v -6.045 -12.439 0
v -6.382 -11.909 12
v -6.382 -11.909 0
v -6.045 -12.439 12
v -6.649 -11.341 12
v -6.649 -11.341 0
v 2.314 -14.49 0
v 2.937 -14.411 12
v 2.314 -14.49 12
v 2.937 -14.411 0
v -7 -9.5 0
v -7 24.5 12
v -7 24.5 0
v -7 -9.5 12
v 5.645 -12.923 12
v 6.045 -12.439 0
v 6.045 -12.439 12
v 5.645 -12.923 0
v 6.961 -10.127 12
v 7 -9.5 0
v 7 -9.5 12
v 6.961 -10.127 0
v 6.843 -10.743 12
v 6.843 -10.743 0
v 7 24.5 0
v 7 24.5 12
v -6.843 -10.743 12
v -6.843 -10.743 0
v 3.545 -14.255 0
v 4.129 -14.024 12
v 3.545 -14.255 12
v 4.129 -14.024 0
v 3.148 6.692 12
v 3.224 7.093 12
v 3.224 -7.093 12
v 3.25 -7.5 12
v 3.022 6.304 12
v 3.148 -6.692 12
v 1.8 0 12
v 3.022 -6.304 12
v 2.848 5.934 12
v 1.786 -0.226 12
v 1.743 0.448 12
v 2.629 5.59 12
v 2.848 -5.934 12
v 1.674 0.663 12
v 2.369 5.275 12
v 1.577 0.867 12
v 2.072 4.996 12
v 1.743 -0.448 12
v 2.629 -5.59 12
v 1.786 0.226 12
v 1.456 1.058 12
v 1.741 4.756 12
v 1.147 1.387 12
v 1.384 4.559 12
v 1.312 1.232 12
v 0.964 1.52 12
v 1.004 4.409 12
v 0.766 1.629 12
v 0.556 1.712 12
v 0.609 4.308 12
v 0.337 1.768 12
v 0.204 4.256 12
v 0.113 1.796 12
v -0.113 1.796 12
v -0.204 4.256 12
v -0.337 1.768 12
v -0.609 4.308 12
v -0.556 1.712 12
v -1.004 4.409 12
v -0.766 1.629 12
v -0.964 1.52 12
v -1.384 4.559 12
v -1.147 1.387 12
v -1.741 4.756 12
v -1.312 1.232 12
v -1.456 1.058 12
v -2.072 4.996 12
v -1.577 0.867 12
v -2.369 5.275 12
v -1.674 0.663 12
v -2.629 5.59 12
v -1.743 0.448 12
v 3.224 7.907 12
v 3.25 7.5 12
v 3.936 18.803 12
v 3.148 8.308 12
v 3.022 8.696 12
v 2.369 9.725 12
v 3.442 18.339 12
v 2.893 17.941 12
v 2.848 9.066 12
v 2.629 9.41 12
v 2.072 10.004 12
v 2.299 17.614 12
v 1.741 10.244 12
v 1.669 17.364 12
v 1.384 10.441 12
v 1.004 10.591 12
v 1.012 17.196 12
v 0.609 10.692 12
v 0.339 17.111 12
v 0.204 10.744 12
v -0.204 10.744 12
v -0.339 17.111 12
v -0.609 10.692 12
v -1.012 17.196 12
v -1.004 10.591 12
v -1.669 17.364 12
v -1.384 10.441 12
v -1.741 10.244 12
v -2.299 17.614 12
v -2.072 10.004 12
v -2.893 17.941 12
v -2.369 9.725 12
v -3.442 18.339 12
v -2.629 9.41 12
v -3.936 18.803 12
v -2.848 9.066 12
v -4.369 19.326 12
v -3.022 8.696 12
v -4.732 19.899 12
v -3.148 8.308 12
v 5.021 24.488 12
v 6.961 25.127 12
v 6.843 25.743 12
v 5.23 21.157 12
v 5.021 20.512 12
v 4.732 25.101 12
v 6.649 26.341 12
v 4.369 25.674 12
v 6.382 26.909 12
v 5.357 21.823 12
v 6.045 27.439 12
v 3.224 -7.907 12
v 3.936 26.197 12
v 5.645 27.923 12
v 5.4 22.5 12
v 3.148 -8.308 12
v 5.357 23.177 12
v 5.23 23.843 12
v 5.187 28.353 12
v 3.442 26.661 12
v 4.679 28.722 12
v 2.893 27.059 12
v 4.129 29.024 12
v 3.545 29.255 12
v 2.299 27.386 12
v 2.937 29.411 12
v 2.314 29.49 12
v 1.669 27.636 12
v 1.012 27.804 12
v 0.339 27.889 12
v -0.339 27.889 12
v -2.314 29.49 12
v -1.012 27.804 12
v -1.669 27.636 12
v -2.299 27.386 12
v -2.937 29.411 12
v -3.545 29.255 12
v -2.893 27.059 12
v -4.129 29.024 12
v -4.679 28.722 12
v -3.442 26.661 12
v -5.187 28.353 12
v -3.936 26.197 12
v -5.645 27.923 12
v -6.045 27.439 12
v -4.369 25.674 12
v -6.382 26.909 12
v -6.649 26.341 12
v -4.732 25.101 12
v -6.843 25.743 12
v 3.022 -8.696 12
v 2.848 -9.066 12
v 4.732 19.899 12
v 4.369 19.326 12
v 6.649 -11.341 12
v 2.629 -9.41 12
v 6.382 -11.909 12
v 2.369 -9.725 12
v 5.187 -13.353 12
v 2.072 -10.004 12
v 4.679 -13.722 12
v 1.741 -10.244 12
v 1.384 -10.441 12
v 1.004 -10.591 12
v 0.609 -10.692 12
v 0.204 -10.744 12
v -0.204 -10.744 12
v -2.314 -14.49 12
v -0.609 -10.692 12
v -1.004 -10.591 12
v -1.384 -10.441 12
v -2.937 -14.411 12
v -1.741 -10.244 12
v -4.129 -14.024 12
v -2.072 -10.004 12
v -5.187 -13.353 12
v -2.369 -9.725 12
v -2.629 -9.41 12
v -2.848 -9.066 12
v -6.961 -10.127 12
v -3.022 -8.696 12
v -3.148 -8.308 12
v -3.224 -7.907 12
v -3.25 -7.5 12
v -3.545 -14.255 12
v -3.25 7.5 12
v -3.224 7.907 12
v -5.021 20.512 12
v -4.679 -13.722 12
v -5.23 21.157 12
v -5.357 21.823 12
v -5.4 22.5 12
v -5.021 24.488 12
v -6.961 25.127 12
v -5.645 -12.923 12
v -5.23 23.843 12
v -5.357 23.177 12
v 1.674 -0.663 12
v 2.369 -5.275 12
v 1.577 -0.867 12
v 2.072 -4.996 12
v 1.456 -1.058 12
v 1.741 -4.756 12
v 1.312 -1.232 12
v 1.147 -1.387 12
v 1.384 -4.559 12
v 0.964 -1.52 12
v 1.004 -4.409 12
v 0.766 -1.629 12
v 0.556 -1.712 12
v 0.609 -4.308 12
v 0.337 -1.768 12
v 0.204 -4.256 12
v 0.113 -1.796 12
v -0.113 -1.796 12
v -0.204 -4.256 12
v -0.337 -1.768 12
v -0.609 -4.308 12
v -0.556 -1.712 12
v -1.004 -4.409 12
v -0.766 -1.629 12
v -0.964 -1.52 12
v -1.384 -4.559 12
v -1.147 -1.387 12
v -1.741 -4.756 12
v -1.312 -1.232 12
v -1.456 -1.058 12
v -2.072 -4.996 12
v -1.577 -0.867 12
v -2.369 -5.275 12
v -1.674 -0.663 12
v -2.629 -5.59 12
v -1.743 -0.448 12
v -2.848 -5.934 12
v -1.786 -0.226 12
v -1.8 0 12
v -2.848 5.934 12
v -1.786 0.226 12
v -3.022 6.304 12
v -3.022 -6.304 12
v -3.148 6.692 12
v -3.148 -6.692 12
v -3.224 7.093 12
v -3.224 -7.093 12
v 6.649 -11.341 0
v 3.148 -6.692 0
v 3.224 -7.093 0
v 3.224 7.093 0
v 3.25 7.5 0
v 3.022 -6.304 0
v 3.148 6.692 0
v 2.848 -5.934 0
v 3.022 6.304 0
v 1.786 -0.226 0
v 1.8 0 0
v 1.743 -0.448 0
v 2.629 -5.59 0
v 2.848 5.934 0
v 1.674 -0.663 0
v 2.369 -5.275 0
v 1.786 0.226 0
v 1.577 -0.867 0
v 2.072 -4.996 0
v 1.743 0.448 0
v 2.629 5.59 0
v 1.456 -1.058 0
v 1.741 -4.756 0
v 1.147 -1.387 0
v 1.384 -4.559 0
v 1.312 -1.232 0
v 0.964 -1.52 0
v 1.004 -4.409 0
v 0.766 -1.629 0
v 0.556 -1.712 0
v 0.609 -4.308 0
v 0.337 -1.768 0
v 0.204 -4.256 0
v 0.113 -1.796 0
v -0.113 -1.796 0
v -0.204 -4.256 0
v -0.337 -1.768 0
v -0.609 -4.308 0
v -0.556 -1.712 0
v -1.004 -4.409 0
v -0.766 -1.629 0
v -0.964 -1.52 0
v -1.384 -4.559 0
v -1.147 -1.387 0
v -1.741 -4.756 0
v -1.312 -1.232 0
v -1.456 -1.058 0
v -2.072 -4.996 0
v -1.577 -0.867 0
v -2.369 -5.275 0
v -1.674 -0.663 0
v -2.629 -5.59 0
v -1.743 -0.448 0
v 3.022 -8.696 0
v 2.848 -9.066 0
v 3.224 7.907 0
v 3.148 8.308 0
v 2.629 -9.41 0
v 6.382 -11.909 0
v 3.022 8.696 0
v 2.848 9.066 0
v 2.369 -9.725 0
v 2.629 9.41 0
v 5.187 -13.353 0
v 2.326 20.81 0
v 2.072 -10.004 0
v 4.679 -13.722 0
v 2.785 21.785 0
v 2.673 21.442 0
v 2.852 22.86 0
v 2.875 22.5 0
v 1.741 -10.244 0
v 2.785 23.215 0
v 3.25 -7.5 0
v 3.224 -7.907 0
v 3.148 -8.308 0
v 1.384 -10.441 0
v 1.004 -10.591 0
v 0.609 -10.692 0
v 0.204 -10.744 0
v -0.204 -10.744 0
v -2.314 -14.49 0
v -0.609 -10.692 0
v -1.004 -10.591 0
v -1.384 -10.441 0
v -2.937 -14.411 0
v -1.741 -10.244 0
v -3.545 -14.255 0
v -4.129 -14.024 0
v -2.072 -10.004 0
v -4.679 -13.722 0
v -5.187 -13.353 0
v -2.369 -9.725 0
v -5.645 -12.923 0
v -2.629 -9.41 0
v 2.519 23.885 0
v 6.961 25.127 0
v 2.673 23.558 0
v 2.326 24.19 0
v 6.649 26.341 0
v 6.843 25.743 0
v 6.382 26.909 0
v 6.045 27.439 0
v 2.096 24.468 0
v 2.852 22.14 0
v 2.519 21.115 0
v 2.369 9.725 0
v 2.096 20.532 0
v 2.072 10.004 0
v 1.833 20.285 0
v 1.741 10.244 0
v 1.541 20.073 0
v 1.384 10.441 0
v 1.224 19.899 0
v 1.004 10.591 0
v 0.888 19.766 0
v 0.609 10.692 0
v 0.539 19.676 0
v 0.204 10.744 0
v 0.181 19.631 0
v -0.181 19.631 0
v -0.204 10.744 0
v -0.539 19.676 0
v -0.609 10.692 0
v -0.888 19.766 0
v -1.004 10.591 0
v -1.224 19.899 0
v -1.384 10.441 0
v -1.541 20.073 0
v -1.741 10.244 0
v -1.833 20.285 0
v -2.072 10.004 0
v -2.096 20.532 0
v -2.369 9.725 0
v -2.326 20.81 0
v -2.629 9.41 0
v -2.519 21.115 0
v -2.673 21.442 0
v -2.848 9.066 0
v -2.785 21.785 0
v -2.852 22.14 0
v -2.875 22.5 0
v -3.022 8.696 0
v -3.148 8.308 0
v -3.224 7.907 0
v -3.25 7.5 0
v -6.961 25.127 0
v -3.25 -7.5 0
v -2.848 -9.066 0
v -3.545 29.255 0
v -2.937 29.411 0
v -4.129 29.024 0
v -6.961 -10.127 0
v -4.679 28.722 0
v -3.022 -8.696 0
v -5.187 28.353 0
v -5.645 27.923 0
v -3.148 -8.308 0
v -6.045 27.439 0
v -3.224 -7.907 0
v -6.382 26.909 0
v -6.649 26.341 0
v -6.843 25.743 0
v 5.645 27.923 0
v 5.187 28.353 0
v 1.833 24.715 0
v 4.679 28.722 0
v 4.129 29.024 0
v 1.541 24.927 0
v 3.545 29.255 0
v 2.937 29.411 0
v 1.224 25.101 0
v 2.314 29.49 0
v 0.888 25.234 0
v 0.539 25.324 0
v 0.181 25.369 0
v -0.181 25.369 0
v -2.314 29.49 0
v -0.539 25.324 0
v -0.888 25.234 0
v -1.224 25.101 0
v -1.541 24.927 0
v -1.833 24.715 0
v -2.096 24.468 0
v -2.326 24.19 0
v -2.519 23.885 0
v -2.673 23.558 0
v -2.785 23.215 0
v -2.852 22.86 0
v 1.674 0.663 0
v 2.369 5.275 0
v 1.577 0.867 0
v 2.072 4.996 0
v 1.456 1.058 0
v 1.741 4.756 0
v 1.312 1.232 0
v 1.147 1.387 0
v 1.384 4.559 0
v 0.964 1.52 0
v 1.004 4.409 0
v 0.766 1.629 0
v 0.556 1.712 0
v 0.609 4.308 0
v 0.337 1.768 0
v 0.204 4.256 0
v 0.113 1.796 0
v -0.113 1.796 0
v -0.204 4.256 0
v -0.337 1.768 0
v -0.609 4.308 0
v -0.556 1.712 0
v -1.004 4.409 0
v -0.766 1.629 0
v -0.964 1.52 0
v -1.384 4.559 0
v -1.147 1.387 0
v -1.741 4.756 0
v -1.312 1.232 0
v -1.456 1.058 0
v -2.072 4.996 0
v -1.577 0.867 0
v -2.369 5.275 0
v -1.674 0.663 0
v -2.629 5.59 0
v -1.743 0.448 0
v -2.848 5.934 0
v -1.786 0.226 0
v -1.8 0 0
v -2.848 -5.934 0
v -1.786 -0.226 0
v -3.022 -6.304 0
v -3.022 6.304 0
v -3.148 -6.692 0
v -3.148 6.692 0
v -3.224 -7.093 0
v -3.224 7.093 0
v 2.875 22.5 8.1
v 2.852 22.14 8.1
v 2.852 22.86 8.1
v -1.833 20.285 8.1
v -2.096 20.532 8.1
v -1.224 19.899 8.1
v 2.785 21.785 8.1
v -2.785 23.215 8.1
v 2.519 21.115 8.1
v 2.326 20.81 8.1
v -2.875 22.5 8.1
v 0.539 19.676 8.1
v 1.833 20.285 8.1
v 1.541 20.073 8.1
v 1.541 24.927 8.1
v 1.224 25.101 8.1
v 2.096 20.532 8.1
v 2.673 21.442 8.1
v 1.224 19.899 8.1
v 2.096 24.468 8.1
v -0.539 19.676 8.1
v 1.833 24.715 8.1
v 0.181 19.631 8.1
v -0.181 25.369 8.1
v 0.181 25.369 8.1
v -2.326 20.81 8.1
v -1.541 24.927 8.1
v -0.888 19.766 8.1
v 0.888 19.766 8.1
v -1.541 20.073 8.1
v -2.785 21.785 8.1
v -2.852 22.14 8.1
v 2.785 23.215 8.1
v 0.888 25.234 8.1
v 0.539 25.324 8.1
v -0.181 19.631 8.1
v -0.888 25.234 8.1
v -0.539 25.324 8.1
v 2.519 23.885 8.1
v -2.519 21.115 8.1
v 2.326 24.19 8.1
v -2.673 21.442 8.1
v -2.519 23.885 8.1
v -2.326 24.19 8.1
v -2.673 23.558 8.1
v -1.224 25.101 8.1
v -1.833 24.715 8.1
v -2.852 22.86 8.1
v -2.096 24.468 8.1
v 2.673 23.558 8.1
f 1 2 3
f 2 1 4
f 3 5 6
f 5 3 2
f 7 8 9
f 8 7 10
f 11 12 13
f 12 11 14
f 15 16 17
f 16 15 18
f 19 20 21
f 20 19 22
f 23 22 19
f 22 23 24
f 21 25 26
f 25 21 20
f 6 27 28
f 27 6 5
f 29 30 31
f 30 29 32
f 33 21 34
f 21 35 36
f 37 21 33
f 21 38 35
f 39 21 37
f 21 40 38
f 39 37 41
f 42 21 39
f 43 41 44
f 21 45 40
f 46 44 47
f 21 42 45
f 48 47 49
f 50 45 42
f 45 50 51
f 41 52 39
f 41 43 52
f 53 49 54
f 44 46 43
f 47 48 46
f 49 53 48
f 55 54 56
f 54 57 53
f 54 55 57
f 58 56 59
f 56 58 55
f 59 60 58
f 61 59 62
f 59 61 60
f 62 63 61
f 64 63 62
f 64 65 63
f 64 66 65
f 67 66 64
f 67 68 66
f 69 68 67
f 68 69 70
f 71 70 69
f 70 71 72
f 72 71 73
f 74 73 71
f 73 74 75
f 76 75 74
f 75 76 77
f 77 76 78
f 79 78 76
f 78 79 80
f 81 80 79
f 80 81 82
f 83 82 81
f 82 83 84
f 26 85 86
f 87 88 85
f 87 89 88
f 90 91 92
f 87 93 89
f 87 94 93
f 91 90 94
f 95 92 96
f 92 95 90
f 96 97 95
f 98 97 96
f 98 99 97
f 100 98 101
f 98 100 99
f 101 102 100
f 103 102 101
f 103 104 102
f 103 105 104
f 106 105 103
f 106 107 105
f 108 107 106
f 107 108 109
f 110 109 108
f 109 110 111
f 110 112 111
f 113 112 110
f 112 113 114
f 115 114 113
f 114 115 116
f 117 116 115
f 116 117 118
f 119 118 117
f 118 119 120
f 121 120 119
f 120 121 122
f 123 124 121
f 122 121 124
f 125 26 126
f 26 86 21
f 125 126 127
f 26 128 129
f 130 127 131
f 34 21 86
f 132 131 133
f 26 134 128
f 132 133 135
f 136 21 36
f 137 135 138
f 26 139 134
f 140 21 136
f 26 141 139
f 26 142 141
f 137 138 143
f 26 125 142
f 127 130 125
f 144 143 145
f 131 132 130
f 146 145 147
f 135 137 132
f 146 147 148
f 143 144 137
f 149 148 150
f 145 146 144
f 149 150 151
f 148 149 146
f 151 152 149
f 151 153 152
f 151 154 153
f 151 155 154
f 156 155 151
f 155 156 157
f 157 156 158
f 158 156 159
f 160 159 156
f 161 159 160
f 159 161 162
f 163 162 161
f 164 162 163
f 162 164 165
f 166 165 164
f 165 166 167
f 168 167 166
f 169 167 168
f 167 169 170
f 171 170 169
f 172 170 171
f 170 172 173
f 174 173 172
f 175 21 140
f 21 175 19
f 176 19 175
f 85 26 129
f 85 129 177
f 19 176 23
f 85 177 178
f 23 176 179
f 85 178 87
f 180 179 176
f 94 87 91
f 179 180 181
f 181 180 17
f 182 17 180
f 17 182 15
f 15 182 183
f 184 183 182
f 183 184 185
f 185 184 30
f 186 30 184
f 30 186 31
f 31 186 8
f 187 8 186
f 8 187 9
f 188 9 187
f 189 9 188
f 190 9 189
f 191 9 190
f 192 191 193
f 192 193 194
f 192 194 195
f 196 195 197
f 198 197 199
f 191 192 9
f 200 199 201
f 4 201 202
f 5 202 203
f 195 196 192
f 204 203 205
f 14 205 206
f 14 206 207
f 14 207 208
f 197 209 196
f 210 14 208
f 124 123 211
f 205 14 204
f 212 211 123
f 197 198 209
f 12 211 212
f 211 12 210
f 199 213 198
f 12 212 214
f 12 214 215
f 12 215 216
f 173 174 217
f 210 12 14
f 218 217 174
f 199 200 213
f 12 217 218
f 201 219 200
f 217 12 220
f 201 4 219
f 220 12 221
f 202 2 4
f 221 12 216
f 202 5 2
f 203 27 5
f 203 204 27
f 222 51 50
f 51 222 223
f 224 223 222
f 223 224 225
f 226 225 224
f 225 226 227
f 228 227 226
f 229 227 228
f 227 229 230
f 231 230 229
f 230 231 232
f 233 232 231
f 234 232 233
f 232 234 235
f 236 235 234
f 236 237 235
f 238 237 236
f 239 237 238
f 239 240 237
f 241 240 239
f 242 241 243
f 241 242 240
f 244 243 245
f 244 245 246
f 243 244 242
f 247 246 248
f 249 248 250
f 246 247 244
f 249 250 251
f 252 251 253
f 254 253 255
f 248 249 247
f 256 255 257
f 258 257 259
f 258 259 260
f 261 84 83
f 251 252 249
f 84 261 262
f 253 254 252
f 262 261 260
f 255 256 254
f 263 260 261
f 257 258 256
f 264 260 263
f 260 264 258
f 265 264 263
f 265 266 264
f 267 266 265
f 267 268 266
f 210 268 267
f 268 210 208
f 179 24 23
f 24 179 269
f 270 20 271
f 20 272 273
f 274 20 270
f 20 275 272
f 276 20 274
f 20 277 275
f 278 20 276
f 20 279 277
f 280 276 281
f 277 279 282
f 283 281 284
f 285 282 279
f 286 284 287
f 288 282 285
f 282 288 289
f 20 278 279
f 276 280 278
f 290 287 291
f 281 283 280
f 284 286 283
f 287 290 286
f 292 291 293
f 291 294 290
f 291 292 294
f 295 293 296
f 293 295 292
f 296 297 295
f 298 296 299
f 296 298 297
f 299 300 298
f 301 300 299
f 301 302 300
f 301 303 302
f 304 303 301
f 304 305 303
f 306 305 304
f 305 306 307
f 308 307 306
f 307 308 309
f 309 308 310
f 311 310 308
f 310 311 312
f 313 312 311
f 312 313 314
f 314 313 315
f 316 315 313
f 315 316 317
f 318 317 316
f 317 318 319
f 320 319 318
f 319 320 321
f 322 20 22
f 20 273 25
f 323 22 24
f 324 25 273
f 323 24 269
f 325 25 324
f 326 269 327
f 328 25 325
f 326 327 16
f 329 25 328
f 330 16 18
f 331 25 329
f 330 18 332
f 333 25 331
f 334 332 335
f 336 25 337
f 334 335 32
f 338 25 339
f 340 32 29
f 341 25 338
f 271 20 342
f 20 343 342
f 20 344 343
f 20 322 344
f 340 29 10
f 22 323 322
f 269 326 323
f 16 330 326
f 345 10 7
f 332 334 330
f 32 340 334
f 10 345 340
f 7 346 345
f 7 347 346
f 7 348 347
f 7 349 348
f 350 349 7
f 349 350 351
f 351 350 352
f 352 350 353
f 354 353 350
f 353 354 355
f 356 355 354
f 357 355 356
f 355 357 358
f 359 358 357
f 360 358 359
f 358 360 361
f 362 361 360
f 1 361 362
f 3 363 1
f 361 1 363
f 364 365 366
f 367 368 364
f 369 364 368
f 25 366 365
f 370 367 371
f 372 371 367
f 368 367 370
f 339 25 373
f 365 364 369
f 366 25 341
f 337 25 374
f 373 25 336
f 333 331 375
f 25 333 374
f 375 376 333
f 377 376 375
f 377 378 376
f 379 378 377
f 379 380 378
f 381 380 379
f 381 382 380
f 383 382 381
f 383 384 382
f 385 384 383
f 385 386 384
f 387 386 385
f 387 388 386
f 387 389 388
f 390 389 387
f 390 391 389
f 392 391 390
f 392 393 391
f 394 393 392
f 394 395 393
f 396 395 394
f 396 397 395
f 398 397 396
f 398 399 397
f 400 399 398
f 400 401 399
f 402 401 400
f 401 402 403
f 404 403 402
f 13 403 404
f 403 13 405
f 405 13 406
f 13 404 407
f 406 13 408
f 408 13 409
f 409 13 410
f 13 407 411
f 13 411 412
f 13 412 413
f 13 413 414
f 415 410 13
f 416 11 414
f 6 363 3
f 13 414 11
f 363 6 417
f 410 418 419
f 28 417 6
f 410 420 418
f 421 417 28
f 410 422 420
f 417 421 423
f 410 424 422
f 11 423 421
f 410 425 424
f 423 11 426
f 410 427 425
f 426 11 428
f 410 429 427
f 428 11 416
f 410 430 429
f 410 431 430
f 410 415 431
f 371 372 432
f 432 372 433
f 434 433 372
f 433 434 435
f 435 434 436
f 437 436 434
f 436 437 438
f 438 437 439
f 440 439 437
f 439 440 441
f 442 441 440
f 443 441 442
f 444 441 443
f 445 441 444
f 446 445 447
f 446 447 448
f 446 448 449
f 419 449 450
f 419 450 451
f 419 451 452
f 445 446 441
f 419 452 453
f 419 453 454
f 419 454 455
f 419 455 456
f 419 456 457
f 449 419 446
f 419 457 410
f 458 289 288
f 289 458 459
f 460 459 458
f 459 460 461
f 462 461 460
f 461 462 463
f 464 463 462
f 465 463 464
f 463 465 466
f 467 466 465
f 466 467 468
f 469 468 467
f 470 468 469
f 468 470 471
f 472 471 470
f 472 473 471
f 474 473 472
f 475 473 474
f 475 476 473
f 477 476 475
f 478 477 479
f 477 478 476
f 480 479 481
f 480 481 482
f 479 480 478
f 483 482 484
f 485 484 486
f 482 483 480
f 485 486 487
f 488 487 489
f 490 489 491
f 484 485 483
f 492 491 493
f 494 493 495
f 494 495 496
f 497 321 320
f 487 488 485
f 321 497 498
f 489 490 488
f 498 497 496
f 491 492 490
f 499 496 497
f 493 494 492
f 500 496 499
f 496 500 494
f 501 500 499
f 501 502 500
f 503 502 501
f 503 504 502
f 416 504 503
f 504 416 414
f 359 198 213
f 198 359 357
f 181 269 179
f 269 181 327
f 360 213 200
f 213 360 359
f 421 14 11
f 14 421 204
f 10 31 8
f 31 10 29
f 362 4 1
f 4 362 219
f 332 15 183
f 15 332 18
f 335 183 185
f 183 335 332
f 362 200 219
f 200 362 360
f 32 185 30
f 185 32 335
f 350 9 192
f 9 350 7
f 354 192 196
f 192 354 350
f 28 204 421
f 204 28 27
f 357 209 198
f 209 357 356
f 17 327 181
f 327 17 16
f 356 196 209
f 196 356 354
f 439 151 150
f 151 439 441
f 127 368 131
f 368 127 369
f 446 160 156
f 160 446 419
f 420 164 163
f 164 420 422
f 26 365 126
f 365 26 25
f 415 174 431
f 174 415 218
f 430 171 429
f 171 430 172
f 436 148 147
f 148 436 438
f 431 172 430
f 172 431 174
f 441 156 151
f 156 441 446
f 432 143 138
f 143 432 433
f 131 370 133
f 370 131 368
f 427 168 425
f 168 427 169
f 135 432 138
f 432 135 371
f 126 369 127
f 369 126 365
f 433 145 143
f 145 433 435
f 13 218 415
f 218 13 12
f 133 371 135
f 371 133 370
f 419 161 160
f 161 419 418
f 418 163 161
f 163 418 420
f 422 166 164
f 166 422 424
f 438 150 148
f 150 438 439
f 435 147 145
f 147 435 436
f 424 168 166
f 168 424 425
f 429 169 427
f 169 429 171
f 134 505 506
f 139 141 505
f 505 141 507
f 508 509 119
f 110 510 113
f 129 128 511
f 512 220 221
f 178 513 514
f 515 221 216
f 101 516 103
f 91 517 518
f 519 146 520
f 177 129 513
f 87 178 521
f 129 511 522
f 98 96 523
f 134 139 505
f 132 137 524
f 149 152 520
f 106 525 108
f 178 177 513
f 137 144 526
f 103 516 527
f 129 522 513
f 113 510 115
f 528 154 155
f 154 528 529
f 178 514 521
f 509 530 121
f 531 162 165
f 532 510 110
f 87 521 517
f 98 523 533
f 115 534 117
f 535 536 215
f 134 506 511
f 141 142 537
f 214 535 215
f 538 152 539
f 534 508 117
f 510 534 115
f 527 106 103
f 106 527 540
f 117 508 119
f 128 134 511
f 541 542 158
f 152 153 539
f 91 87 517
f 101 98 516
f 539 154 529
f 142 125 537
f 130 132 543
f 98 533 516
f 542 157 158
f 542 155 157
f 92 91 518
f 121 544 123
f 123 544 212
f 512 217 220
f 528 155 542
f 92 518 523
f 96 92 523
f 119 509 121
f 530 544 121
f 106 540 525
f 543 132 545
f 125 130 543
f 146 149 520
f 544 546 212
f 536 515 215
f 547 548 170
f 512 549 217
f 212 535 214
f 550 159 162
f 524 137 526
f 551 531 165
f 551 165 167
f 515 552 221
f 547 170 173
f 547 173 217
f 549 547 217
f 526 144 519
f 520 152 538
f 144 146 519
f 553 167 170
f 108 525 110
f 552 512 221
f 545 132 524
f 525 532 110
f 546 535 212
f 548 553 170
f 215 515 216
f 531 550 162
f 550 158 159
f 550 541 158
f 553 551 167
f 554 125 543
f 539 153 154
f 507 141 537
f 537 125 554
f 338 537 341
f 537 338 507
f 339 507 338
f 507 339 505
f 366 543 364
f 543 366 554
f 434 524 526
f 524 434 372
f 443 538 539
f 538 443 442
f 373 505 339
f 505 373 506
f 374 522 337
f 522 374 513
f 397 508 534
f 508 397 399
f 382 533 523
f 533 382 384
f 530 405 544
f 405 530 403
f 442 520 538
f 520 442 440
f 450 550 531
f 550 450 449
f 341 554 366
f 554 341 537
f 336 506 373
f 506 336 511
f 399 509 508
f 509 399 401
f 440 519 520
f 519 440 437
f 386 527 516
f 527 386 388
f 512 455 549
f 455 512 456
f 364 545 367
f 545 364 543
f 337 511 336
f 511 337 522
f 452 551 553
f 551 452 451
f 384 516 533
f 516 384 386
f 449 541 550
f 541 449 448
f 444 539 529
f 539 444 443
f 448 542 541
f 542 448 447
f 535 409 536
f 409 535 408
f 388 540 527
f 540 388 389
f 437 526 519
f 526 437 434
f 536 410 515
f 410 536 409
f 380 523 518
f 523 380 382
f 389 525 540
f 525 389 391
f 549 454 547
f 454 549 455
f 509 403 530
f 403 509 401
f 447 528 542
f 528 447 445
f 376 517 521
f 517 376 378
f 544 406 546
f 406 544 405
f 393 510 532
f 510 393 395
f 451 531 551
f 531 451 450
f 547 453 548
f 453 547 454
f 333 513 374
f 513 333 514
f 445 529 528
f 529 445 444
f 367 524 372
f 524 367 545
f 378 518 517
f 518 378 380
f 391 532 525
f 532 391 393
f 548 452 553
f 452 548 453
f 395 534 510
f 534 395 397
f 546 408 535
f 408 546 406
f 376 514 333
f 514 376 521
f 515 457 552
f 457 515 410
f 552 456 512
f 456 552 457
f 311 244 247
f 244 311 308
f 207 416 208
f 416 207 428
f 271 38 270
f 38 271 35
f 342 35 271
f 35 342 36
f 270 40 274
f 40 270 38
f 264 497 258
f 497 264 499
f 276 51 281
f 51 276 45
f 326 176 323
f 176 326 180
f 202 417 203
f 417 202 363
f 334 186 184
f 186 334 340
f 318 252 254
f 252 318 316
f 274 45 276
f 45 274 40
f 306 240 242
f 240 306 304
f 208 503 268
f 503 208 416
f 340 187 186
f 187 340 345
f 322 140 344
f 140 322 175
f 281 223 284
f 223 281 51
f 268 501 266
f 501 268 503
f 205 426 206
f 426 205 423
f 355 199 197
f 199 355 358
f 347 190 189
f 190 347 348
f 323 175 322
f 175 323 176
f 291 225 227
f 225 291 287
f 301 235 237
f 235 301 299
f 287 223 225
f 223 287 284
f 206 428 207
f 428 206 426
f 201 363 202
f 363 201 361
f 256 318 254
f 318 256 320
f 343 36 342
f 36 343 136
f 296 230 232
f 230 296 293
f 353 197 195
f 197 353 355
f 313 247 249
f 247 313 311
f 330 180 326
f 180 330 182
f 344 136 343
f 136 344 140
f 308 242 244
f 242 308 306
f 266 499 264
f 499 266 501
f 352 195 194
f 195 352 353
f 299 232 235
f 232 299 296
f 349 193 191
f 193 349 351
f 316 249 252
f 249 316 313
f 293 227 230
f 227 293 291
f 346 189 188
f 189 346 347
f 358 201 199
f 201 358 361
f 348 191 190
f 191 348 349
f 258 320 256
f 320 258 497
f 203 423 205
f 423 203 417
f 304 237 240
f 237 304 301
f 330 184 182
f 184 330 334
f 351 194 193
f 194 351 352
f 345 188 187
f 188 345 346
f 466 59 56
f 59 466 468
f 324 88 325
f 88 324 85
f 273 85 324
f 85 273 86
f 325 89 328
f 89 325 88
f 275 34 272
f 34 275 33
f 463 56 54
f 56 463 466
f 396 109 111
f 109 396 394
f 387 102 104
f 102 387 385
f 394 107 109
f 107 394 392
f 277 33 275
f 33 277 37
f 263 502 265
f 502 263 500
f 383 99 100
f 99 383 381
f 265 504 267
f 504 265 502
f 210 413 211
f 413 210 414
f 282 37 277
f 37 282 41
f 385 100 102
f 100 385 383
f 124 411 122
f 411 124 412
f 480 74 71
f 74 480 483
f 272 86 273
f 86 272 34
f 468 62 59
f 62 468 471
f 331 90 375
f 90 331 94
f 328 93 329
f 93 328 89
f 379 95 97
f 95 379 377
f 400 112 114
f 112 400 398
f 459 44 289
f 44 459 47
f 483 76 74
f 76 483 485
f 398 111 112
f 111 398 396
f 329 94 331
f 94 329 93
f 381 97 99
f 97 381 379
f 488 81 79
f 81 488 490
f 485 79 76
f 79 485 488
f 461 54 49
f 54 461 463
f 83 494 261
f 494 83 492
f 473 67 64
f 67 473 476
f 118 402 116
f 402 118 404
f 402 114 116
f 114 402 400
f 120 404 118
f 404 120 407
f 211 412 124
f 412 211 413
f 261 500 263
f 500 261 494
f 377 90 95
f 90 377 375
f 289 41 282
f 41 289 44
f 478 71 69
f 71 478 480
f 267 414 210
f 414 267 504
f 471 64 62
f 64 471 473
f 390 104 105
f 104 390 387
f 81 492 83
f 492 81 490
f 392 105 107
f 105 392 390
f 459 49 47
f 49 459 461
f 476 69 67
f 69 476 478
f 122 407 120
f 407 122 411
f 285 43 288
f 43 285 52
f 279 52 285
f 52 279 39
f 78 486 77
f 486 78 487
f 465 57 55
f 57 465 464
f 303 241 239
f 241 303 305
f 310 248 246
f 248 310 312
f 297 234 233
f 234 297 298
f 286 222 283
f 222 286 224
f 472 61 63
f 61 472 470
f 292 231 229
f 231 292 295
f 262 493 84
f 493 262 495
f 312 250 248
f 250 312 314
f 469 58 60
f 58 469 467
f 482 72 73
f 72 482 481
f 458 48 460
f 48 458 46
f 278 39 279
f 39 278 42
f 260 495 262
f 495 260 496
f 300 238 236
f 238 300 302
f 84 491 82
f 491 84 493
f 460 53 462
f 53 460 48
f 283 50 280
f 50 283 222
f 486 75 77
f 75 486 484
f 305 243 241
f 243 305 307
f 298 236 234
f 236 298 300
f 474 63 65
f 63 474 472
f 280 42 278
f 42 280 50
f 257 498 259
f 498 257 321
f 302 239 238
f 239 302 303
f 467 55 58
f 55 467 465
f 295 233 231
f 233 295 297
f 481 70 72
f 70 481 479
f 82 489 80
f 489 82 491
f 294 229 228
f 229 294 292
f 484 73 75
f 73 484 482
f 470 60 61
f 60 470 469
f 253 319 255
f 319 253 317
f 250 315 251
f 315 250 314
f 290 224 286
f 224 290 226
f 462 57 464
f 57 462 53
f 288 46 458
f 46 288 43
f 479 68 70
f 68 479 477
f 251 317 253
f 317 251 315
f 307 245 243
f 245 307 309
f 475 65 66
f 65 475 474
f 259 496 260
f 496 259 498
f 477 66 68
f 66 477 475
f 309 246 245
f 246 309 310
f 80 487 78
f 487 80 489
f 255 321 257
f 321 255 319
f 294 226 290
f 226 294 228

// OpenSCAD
$fn = 50;


difference() {
	union() {
		hull() {
			translate(v = [-2.0000000000, 9.5000000000, 0]) {
				cylinder(h = 12, r = 5);
			}
			translate(v = [2.0000000000, 9.5000000000, 0]) {
				cylinder(h = 12, r = 5);
			}
			translate(v = [-2.0000000000, -9.5000000000, 0]) {
				cylinder(h = 12, r = 5);
			}
			translate(v = [2.0000000000, -9.5000000000, 0]) {
				cylinder(h = 12, r = 5);
			}
		}
		translate(v = [0.0000000000, 15.0000000000, 0]) {
			hull() {
				translate(v = [-2.0000000000, 9.5000000000, 0]) {
					cylinder(h = 12, r = 5);
				}
				translate(v = [2.0000000000, 9.5000000000, 0]) {
					cylinder(h = 12, r = 5);
				}
				translate(v = [-2.0000000000, -9.5000000000, 0]) {
					cylinder(h = 12, r = 5);
				}
				translate(v = [2.0000000000, -9.5000000000, 0]) {
					cylinder(h = 12, r = 5);
				}
			}
		}
		translate(v = [0.0000000000, 15.0000000000, 0]) {
			hull() {
				translate(v = [-2.0000000000, 9.5000000000, 0]) {
					cylinder(h = 12, r = 5);
				}
				translate(v = [2.0000000000, 9.5000000000, 0]) {
					cylinder(h = 12, r = 5);
				}
				translate(v = [-2.0000000000, -9.5000000000, 0]) {
					cylinder(h = 12, r = 5);
				}
				translate(v = [2.0000000000, -9.5000000000, 0]) {
					cylinder(h = 12, r = 5);
				}
			}
		}
	}
	union() {
		translate(v = [0.0000000000, 22.5000000000, 12]) {
			rotate(a = [0, 0, 0]) {
				difference() {
					union() {
						#translate(v = [0, 0, -12.0000000000]) {
							cylinder(h = 12, r = 2.6000000000);
						}
						#translate(v = [0, 0, -3.9000000000]) {
							cylinder(h = 3.9000000000, r1 = 2.8750000000, r2 = 5.4000000000);
						}
						#translate(v = [0, 0, -12.0000000000]) {
							cylinder(h = 12, r = 2.8750000000);
						}
						#translate(v = [0, 0, -12.0000000000]) {
							cylinder(h = 12, r = 2.6000000000);
						}
					}
					union();
				}
			}
		}
		translate(v = [0.0000000000, 22.5000000000, 12]) {
			rotate(a = [0, 0, 0]) {
				difference() {
					union() {
						#translate(v = [0, 0, -12.0000000000]) {
							cylinder(h = 12, r = 2.6000000000);
						}
						#translate(v = [0, 0, -3.9000000000]) {
							cylinder(h = 3.9000000000, r1 = 2.8750000000, r2 = 5.4000000000);
						}
						#translate(v = [0, 0, -12.0000000000]) {
							cylinder(h = 12, r = 2.8750000000);
						}
						#translate(v = [0, 0, -12.0000000000]) {
							cylinder(h = 12, r = 2.6000000000);
						}
					}
					union();
				}
			}
		}
		translate(v = [0.0000000000, -7.5000000000, 0]) {
			translate(v = [0, 0, -100]) {
				cylinder(h = 200, r = 3.2500000000);
			}
		}
		translate(v = [0.0000000000, 7.5000000000, 0]) {
			translate(v = [0, 0, -100]) {
				cylinder(h = 200, r = 3.2500000000);
			}
		}
		translate(v = [0.0000000000, -7.5000000000, 0]) {
			translate(v = [0, 0, -100]) {
				cylinder(h = 200, r = 1.8000000000);
			}
		}
		translate(v = [0, 0, -100]) {
			cylinder(h = 200, r = 1.8000000000);
		}
		translate(v = [0.0000000000, 7.5000000000, 0]) {
			translate(v = [0, 0, -100]) {
				cylinder(h = 200, r = 1.8000000000);
			}
		}
	}
}
